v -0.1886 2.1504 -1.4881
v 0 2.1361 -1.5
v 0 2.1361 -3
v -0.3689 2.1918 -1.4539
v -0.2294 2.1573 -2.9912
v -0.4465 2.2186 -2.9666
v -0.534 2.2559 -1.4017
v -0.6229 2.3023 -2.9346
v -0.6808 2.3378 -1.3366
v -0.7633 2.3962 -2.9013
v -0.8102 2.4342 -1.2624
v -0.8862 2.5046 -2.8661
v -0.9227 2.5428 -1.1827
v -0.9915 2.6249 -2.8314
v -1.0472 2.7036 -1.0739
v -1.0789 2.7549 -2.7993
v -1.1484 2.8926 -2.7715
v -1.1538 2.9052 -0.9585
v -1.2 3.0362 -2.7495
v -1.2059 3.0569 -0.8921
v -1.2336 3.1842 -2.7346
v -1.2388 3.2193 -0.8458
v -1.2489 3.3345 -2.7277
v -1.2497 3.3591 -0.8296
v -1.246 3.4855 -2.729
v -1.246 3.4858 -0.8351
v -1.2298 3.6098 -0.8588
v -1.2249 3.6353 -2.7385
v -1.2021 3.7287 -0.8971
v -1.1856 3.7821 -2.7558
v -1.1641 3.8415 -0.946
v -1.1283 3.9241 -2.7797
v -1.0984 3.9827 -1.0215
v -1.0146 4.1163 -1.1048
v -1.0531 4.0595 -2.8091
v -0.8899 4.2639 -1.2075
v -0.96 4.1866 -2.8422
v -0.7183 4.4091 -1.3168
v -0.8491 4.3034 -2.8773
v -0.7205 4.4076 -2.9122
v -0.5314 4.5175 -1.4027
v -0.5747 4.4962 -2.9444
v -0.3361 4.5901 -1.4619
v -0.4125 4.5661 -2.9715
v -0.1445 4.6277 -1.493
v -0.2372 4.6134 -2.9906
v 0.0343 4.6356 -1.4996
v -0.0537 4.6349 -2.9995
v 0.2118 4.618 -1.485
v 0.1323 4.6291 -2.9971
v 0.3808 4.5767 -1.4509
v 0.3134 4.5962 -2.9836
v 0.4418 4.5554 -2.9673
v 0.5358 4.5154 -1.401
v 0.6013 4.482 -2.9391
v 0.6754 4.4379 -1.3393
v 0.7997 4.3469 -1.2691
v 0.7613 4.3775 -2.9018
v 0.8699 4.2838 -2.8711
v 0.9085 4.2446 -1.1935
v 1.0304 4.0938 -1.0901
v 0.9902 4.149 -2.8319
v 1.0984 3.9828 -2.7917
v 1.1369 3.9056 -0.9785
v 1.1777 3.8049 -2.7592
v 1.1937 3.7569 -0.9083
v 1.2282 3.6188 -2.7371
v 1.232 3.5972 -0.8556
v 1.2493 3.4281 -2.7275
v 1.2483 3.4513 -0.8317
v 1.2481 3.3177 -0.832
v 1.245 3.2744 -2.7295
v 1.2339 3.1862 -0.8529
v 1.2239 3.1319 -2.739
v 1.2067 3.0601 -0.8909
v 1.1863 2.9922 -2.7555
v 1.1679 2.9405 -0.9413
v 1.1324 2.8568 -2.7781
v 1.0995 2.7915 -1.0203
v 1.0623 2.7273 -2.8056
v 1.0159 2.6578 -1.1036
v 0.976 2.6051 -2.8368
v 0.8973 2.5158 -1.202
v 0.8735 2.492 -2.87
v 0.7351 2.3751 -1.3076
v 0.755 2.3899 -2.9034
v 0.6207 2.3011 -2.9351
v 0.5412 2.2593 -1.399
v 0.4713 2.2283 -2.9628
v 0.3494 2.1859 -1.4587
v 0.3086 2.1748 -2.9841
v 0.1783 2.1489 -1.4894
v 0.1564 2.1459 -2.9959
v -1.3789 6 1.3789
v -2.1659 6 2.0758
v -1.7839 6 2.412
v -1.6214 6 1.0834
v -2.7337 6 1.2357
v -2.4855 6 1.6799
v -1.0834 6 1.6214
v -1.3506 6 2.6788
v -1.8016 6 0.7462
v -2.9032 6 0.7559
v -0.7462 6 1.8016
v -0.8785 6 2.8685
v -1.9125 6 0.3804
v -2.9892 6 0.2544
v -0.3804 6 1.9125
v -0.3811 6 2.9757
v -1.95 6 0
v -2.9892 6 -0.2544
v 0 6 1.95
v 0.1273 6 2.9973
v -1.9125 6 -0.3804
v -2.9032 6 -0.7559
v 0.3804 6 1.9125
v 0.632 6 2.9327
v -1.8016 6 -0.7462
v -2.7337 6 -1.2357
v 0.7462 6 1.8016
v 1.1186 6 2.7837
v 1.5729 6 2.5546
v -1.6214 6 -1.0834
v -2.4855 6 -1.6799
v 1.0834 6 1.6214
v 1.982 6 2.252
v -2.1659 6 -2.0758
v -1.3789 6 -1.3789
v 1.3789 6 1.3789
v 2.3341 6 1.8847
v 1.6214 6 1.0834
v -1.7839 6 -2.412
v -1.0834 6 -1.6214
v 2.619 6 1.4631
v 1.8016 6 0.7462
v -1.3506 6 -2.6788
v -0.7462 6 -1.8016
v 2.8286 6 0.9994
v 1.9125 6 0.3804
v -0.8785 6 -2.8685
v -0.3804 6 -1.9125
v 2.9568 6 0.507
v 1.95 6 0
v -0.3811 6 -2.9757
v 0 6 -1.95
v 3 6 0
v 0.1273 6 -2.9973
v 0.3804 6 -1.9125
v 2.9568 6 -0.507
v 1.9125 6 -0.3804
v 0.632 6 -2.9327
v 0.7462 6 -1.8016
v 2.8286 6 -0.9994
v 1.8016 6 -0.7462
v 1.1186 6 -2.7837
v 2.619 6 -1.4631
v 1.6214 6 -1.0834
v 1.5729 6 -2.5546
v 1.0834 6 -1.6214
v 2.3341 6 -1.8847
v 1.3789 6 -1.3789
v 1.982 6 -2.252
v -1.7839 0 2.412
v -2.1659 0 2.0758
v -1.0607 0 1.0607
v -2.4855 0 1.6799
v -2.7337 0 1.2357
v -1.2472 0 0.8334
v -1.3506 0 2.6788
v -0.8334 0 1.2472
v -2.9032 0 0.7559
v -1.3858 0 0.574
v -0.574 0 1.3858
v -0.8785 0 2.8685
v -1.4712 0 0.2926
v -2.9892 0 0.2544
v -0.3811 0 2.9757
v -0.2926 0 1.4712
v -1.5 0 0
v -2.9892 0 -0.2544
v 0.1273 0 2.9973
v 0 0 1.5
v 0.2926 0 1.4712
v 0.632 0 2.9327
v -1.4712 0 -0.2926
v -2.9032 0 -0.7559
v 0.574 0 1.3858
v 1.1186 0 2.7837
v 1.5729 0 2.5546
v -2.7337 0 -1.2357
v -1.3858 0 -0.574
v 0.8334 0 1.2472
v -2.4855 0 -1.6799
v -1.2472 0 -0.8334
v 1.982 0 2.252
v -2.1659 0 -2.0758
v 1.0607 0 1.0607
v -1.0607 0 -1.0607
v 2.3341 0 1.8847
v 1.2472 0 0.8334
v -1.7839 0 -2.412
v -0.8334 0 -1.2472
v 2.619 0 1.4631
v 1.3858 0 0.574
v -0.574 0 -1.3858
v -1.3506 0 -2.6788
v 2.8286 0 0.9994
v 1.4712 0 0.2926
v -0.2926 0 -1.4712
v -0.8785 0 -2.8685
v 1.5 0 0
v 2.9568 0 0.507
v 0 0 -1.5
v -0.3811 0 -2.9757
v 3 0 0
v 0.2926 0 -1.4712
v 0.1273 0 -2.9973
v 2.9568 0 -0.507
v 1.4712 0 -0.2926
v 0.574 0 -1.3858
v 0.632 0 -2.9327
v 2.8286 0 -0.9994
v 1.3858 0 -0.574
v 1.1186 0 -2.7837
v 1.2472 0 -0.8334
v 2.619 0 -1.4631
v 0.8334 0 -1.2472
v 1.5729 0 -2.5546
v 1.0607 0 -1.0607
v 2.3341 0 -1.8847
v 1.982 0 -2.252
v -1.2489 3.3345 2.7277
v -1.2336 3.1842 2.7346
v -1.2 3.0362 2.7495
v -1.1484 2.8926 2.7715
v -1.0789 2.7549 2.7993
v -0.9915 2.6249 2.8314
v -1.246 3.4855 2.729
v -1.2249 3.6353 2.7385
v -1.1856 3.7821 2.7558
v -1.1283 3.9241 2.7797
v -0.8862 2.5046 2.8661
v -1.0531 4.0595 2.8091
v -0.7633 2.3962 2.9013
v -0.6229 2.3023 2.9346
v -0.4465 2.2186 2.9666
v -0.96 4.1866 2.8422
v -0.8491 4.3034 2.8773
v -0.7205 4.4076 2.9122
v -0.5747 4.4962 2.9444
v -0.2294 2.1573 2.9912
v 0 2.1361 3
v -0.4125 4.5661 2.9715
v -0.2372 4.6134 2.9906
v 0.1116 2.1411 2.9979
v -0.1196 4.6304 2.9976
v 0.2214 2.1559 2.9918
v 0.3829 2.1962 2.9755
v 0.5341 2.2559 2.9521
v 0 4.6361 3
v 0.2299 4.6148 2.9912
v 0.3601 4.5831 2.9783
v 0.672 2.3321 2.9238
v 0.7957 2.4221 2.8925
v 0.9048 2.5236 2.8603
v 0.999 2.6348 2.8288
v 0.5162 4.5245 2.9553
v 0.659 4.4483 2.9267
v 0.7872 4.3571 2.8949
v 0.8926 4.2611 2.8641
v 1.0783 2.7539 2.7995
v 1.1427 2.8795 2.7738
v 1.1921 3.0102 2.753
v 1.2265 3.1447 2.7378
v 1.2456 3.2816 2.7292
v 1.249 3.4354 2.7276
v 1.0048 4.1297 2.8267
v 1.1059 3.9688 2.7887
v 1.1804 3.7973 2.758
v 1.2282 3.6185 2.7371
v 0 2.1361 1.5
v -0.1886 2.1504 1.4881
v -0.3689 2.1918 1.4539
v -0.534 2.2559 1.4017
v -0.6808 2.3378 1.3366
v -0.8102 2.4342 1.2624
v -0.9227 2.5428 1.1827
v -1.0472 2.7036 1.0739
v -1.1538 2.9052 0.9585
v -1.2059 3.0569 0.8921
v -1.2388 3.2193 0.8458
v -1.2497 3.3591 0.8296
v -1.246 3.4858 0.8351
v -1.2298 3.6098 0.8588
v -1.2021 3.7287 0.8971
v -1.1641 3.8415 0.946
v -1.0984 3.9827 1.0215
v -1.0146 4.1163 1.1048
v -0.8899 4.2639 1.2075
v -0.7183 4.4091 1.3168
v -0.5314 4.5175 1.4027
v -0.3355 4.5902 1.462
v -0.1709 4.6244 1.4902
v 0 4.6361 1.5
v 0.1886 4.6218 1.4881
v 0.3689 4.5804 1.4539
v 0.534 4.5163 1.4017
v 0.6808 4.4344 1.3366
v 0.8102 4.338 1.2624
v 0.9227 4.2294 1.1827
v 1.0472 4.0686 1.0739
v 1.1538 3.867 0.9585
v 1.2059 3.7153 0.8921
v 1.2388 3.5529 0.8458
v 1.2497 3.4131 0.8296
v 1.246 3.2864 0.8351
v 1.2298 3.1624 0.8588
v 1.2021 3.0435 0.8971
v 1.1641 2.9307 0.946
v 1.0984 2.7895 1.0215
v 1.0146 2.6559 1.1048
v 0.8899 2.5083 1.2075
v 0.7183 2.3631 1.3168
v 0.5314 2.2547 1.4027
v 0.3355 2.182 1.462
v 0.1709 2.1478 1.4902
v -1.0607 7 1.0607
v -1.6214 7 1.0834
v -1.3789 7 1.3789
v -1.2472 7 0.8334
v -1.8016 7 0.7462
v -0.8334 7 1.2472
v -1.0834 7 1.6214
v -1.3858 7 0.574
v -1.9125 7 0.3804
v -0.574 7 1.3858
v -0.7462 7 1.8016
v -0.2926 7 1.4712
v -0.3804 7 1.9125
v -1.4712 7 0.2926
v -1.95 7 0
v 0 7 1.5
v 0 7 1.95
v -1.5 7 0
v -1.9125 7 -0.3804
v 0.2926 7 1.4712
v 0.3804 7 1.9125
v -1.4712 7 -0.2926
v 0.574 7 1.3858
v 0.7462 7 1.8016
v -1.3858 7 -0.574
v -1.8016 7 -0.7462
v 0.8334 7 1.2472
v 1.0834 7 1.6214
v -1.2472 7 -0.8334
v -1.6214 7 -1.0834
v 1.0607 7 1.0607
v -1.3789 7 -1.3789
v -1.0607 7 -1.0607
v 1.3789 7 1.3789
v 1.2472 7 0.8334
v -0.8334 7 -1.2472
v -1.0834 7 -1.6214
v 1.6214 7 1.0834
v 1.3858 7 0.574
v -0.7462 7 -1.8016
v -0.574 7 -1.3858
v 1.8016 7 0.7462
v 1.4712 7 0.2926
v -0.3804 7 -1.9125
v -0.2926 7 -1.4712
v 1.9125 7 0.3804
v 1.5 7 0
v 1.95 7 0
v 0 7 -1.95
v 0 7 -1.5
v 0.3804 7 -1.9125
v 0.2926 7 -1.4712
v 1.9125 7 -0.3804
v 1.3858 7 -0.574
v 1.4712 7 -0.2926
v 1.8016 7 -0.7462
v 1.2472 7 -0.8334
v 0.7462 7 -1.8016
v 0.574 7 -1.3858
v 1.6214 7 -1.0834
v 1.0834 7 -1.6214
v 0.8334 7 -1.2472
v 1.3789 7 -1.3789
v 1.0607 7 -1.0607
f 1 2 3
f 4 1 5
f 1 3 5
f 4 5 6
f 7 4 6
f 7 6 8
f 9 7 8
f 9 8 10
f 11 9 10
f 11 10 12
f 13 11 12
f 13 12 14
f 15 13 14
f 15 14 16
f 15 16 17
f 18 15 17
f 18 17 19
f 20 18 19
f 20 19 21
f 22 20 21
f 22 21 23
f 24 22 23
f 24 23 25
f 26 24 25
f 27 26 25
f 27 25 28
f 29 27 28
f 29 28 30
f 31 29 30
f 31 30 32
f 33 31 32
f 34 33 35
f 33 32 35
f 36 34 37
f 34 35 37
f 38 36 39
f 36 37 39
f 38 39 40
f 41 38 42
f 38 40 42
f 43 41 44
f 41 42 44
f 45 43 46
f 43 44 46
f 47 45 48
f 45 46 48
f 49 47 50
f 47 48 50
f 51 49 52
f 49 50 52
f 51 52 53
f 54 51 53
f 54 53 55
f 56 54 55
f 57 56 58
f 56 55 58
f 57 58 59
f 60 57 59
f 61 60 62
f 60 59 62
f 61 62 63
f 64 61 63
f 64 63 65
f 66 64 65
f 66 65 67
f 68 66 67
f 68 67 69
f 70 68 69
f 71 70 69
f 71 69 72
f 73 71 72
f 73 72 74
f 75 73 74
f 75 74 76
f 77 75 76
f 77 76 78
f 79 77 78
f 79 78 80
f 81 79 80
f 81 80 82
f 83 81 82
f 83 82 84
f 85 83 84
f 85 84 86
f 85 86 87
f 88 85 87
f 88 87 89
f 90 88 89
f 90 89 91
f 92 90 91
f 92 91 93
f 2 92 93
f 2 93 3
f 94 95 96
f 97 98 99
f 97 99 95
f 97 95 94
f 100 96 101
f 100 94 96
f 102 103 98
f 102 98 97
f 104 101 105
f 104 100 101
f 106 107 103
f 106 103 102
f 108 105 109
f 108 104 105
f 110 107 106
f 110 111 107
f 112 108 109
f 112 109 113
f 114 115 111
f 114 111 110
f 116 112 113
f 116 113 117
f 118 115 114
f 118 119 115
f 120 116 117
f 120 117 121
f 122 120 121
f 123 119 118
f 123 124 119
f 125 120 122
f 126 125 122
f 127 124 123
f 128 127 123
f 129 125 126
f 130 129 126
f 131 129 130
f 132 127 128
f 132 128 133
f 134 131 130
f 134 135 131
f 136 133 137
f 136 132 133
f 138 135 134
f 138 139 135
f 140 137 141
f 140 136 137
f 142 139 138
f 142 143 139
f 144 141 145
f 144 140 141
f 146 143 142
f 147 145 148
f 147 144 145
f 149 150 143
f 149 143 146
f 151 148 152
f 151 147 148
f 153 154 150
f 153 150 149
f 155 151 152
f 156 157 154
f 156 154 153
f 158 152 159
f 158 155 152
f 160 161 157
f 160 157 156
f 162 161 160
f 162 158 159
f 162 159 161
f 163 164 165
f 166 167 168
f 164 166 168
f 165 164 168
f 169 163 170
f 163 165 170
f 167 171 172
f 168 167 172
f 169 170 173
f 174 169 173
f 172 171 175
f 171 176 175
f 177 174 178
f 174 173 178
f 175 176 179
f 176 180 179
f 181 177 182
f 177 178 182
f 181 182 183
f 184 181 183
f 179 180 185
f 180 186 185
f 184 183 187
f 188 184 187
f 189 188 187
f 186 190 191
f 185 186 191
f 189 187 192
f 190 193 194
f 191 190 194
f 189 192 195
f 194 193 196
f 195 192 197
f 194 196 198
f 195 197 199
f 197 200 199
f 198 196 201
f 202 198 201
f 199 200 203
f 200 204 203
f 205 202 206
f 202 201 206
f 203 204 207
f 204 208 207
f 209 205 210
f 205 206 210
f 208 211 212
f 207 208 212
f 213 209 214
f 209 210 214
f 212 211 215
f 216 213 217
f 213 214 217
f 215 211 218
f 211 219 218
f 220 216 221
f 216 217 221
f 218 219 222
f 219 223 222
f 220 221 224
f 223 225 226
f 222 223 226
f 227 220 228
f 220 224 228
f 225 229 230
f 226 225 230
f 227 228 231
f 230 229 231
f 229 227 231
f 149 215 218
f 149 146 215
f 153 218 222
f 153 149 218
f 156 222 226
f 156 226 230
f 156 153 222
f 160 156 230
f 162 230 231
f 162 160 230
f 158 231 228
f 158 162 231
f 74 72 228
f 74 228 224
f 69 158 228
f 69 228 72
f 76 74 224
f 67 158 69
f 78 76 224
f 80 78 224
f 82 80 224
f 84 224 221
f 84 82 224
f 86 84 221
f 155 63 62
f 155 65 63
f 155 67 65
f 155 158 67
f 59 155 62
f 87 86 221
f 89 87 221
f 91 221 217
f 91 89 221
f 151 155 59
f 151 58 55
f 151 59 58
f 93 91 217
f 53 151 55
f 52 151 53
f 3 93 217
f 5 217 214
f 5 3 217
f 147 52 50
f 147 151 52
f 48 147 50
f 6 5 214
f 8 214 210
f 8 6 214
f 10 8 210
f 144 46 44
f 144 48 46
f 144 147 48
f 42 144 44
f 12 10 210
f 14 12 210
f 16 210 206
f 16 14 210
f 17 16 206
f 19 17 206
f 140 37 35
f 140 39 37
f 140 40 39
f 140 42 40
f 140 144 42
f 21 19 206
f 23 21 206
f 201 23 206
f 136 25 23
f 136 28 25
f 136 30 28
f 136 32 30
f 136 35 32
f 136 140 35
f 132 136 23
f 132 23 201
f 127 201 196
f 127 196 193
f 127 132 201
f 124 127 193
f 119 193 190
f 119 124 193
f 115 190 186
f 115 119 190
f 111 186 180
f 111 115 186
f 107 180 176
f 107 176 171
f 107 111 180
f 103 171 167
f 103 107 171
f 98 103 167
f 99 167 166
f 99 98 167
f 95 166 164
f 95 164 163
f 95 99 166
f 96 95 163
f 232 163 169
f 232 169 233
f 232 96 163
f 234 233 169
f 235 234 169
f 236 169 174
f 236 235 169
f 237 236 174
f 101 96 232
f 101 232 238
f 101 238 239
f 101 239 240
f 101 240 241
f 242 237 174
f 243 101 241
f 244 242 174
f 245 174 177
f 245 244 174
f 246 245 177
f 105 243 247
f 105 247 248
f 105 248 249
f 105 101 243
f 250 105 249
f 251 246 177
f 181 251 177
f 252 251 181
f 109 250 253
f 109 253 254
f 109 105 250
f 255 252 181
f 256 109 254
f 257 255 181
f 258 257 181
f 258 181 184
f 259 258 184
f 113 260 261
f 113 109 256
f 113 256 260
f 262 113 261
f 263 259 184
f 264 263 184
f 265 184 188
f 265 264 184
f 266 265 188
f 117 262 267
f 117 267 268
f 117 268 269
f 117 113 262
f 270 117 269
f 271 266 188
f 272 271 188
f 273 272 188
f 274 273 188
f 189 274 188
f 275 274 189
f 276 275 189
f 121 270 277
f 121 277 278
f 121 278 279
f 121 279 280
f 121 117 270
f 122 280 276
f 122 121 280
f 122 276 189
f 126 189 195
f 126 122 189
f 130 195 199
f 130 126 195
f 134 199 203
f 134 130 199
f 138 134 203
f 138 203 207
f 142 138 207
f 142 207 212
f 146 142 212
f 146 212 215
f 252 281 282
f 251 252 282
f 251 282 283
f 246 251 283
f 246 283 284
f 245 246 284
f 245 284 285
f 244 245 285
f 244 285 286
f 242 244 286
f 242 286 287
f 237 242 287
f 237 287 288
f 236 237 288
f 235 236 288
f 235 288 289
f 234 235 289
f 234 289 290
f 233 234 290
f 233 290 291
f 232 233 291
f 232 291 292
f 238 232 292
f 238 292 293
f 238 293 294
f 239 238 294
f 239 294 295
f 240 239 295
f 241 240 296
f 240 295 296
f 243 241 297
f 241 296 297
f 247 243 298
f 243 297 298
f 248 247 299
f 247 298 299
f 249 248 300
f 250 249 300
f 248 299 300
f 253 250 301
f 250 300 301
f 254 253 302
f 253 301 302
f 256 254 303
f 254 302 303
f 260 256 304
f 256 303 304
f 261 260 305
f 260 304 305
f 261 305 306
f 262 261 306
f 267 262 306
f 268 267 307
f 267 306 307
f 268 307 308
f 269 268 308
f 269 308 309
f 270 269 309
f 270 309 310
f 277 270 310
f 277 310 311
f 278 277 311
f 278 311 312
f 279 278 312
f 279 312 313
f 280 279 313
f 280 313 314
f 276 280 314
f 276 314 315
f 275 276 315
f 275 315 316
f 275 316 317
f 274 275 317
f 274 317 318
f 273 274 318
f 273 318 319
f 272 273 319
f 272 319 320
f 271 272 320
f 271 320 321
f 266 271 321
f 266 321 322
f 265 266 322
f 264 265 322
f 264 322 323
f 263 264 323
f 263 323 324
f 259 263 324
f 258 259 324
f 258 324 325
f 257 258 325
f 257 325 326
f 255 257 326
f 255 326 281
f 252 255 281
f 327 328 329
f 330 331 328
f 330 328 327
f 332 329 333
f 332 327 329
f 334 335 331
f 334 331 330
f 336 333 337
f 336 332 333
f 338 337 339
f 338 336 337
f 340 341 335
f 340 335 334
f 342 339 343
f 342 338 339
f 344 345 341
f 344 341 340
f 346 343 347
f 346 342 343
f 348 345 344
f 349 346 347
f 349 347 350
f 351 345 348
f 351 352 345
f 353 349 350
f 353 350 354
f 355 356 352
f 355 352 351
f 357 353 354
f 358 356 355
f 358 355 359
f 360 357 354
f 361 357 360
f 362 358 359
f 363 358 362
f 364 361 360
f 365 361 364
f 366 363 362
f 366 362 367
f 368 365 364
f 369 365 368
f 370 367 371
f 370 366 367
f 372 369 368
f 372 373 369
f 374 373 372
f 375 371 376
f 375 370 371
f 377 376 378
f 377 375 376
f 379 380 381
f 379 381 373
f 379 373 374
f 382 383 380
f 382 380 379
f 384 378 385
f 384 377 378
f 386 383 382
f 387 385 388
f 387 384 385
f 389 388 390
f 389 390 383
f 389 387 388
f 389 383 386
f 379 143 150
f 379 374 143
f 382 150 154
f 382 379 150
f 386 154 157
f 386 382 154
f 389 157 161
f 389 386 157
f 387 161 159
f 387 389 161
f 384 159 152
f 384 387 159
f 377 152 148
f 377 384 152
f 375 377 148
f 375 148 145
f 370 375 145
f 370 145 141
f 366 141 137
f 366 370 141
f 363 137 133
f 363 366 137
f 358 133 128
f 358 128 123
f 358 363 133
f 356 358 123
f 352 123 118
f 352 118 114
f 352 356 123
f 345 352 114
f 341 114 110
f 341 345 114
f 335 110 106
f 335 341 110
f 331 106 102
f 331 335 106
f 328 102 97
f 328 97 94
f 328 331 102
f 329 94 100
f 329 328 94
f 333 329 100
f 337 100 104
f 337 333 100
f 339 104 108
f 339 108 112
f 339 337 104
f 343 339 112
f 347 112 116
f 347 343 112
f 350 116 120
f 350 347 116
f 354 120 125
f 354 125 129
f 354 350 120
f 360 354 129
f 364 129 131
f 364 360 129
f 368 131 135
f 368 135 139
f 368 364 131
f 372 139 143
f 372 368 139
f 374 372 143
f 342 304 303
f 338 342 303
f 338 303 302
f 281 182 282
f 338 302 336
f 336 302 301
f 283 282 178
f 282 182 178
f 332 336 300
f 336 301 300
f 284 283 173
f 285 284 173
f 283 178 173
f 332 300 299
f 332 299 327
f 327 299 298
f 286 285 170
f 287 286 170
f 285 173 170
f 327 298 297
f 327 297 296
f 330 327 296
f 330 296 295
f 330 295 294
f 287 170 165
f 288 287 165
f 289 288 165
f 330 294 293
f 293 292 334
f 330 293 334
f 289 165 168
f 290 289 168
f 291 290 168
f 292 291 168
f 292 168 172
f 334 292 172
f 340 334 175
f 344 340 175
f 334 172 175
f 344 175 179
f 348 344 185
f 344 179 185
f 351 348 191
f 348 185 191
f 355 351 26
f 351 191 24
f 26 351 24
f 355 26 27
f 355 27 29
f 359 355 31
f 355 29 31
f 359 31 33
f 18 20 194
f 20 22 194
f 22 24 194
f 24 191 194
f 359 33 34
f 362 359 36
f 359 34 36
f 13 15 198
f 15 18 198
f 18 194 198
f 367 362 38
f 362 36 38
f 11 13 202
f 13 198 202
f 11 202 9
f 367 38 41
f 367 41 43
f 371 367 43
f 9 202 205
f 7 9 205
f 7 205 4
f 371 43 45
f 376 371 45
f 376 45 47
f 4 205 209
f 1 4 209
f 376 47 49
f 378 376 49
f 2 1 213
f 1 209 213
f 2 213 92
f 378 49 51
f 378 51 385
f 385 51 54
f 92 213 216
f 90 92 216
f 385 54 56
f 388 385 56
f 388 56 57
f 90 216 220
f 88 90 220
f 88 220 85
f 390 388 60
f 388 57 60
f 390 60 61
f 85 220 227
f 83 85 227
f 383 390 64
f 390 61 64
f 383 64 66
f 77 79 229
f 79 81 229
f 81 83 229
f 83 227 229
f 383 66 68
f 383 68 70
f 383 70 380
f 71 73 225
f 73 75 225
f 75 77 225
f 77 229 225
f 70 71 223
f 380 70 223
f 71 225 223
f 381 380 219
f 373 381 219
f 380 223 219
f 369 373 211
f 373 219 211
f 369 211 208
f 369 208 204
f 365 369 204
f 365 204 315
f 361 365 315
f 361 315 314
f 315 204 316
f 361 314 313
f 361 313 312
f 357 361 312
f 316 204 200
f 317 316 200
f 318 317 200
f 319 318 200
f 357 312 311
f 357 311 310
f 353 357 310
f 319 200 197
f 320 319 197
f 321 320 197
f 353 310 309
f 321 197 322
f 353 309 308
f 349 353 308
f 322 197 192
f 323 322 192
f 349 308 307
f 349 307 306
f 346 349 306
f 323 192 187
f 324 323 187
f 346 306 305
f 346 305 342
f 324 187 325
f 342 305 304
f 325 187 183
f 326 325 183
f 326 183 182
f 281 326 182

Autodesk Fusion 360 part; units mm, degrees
cylinder "CylinderPrimitive1" add diameter 6 height 6 placed x (1, 0, 0) y (0, 0, -1) z (0, 1, 0) at (0, 0, 0)
cylinder "CylinderPrimitive2" add diameter 3.9 height 1 placed x (1, 0, 0) y (0, 0, -1) z (0, 1, 0) at (0, 6, 0)
hole "Hole1" at (0, 7, 0) direction (0, -1, 0) diameter 3 end through all
hole "Hole2" at (0, 3.3861, 3) direction (0, 0, -1) diameter 2.5 depth 7 tip angle 118
